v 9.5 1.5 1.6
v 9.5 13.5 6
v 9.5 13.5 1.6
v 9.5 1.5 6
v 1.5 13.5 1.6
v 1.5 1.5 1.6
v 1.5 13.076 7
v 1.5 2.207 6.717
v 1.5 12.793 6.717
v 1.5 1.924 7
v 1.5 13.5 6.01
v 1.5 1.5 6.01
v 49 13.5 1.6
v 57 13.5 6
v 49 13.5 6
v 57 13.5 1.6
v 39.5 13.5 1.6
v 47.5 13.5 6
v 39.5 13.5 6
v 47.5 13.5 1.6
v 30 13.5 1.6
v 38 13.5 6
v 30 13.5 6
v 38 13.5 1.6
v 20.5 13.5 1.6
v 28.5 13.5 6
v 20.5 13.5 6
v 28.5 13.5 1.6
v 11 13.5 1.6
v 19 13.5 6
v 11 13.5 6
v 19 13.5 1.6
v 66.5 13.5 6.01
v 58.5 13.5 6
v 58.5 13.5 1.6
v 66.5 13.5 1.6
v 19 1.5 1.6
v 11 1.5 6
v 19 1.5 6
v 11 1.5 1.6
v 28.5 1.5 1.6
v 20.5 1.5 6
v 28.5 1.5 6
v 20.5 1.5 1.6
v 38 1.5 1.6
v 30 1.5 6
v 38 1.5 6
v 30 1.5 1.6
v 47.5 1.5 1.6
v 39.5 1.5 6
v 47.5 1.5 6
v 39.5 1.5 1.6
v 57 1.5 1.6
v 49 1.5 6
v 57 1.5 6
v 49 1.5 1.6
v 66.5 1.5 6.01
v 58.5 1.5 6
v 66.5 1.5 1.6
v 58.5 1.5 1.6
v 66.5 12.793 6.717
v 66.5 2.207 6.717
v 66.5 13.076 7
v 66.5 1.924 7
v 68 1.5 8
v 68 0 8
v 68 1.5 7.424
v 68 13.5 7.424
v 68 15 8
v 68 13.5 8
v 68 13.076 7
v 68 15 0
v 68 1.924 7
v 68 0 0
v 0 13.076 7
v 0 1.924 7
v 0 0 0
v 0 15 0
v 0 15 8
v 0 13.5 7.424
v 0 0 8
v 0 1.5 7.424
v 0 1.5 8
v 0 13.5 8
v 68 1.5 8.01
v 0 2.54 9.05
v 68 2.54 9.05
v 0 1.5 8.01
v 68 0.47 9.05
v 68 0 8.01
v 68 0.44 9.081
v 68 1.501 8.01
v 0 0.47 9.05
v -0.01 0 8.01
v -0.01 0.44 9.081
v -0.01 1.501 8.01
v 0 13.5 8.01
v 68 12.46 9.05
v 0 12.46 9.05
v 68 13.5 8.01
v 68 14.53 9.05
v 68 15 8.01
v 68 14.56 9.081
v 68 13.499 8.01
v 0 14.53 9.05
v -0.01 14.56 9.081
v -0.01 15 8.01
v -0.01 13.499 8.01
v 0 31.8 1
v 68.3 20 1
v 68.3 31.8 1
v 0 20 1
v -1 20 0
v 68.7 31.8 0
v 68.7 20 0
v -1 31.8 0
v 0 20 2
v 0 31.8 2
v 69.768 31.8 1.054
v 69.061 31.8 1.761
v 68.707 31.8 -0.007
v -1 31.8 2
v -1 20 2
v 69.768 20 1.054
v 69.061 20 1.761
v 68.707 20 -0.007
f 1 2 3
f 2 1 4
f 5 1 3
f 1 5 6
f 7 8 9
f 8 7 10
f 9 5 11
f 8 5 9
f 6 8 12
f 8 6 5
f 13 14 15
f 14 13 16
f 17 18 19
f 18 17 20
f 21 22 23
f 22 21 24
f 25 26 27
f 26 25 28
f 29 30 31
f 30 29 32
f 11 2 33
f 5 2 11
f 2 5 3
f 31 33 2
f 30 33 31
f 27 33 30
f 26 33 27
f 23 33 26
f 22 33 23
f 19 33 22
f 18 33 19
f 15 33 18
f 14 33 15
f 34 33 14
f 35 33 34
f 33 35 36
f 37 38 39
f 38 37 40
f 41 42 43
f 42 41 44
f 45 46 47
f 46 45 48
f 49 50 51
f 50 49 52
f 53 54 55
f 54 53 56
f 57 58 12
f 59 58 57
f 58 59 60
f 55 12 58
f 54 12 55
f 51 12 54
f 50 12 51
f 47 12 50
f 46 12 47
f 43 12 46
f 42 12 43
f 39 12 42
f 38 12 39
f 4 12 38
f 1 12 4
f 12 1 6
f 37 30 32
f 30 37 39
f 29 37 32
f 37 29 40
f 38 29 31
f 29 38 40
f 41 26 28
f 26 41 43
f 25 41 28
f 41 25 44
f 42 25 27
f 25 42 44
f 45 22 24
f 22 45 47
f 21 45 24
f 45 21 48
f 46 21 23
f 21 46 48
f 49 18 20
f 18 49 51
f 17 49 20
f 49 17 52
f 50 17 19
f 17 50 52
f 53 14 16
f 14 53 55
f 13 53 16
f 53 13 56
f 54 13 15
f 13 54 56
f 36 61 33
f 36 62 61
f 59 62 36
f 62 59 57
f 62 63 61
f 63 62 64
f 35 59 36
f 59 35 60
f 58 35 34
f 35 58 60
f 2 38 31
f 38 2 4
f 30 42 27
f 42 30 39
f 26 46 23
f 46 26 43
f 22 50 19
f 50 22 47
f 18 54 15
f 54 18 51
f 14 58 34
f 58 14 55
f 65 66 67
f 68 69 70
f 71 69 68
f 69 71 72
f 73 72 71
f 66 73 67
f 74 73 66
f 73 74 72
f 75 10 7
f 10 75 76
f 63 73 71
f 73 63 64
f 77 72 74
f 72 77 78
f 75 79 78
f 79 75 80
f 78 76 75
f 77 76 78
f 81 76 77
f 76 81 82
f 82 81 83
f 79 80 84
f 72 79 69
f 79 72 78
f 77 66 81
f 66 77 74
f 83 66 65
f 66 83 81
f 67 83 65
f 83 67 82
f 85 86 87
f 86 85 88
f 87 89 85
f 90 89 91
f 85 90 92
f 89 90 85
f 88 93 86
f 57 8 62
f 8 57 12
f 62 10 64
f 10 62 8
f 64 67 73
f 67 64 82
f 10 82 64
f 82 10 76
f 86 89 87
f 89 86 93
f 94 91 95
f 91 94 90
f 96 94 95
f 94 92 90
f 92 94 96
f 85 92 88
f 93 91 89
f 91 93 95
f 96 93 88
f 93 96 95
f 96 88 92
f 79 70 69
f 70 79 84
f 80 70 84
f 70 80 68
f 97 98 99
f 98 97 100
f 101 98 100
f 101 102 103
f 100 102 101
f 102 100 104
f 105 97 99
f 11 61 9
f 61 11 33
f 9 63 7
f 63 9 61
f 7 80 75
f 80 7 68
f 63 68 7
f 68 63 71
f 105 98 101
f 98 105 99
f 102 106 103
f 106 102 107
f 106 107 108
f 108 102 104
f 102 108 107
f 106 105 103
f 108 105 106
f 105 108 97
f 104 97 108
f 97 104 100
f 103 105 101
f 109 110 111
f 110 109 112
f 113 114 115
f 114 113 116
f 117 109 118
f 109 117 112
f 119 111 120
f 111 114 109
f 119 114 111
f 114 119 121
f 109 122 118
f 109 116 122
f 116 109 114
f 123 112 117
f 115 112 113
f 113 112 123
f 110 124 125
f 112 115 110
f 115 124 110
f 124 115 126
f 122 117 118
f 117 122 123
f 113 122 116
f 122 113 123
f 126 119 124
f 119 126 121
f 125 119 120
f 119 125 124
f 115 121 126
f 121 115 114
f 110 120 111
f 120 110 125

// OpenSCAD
//widths for the pill compartments
wp = 8;
//depth for the pill compartments
dp = 12;

//wall size
ws = 1.5;
//pill box height
he = 7;
//wall height (center ones)
wh = he-1;

//tolerance
tol = .1;


difference()
{

cube([wp*7+ws*8, dp+ws*2, he]);

union()
{
translate([ws,ws,0])
for (n = [0:6])
{
translate([n*wp+n*ws,0,ws+.1])
cube([wp,dp,10]);
}
translate([ws,ws,wh])
cube([wp*7+ws*6,dp,he-wh+.1]);

}
}


//lid thingy
module lidthingy()
{
difference()
{
union()
{
translate([0,0,he])
cube([wp*7+ws*8,ws,1]);


translate([0,ws,he+1.01])
rotate([45,0,0])
cube([wp*7+ws*8,ws,ws]);

translate([0,ws,wh+.01])
rotate([45,0,0])
cube([wp*7+ws*8,1,he-wh]);
}

//cut off the roof
translate([-.05,0,he+1+ws*.7])
cube([wp*7+ws*8+.1,ws*2+.1,3]);

}


translate([wp*7+ws*8,0,he+1.01])
rotate([0,-90,0])

linear_extrude(height=wp*7+ws*8+.01)
polygon(points=[[0,0],[0,1.501],[sqrt(2)*(ws/2)+.01,.44]]);

}


lidthingy();

mirror([0,1,0])
translate([0,-dp-ws*2,0])
lidthingy();


translate([0,20,0])
{

cube([wp*7+ws*8+.7,dp-tol*2,1]);
translate([-1,0,0])
cube([1,dp-tol*2,2]);

translate([wp*7+ws*8,0,.7])
rotate([0,45,0])
cube([1,dp-tol*2,1.5]);

}
